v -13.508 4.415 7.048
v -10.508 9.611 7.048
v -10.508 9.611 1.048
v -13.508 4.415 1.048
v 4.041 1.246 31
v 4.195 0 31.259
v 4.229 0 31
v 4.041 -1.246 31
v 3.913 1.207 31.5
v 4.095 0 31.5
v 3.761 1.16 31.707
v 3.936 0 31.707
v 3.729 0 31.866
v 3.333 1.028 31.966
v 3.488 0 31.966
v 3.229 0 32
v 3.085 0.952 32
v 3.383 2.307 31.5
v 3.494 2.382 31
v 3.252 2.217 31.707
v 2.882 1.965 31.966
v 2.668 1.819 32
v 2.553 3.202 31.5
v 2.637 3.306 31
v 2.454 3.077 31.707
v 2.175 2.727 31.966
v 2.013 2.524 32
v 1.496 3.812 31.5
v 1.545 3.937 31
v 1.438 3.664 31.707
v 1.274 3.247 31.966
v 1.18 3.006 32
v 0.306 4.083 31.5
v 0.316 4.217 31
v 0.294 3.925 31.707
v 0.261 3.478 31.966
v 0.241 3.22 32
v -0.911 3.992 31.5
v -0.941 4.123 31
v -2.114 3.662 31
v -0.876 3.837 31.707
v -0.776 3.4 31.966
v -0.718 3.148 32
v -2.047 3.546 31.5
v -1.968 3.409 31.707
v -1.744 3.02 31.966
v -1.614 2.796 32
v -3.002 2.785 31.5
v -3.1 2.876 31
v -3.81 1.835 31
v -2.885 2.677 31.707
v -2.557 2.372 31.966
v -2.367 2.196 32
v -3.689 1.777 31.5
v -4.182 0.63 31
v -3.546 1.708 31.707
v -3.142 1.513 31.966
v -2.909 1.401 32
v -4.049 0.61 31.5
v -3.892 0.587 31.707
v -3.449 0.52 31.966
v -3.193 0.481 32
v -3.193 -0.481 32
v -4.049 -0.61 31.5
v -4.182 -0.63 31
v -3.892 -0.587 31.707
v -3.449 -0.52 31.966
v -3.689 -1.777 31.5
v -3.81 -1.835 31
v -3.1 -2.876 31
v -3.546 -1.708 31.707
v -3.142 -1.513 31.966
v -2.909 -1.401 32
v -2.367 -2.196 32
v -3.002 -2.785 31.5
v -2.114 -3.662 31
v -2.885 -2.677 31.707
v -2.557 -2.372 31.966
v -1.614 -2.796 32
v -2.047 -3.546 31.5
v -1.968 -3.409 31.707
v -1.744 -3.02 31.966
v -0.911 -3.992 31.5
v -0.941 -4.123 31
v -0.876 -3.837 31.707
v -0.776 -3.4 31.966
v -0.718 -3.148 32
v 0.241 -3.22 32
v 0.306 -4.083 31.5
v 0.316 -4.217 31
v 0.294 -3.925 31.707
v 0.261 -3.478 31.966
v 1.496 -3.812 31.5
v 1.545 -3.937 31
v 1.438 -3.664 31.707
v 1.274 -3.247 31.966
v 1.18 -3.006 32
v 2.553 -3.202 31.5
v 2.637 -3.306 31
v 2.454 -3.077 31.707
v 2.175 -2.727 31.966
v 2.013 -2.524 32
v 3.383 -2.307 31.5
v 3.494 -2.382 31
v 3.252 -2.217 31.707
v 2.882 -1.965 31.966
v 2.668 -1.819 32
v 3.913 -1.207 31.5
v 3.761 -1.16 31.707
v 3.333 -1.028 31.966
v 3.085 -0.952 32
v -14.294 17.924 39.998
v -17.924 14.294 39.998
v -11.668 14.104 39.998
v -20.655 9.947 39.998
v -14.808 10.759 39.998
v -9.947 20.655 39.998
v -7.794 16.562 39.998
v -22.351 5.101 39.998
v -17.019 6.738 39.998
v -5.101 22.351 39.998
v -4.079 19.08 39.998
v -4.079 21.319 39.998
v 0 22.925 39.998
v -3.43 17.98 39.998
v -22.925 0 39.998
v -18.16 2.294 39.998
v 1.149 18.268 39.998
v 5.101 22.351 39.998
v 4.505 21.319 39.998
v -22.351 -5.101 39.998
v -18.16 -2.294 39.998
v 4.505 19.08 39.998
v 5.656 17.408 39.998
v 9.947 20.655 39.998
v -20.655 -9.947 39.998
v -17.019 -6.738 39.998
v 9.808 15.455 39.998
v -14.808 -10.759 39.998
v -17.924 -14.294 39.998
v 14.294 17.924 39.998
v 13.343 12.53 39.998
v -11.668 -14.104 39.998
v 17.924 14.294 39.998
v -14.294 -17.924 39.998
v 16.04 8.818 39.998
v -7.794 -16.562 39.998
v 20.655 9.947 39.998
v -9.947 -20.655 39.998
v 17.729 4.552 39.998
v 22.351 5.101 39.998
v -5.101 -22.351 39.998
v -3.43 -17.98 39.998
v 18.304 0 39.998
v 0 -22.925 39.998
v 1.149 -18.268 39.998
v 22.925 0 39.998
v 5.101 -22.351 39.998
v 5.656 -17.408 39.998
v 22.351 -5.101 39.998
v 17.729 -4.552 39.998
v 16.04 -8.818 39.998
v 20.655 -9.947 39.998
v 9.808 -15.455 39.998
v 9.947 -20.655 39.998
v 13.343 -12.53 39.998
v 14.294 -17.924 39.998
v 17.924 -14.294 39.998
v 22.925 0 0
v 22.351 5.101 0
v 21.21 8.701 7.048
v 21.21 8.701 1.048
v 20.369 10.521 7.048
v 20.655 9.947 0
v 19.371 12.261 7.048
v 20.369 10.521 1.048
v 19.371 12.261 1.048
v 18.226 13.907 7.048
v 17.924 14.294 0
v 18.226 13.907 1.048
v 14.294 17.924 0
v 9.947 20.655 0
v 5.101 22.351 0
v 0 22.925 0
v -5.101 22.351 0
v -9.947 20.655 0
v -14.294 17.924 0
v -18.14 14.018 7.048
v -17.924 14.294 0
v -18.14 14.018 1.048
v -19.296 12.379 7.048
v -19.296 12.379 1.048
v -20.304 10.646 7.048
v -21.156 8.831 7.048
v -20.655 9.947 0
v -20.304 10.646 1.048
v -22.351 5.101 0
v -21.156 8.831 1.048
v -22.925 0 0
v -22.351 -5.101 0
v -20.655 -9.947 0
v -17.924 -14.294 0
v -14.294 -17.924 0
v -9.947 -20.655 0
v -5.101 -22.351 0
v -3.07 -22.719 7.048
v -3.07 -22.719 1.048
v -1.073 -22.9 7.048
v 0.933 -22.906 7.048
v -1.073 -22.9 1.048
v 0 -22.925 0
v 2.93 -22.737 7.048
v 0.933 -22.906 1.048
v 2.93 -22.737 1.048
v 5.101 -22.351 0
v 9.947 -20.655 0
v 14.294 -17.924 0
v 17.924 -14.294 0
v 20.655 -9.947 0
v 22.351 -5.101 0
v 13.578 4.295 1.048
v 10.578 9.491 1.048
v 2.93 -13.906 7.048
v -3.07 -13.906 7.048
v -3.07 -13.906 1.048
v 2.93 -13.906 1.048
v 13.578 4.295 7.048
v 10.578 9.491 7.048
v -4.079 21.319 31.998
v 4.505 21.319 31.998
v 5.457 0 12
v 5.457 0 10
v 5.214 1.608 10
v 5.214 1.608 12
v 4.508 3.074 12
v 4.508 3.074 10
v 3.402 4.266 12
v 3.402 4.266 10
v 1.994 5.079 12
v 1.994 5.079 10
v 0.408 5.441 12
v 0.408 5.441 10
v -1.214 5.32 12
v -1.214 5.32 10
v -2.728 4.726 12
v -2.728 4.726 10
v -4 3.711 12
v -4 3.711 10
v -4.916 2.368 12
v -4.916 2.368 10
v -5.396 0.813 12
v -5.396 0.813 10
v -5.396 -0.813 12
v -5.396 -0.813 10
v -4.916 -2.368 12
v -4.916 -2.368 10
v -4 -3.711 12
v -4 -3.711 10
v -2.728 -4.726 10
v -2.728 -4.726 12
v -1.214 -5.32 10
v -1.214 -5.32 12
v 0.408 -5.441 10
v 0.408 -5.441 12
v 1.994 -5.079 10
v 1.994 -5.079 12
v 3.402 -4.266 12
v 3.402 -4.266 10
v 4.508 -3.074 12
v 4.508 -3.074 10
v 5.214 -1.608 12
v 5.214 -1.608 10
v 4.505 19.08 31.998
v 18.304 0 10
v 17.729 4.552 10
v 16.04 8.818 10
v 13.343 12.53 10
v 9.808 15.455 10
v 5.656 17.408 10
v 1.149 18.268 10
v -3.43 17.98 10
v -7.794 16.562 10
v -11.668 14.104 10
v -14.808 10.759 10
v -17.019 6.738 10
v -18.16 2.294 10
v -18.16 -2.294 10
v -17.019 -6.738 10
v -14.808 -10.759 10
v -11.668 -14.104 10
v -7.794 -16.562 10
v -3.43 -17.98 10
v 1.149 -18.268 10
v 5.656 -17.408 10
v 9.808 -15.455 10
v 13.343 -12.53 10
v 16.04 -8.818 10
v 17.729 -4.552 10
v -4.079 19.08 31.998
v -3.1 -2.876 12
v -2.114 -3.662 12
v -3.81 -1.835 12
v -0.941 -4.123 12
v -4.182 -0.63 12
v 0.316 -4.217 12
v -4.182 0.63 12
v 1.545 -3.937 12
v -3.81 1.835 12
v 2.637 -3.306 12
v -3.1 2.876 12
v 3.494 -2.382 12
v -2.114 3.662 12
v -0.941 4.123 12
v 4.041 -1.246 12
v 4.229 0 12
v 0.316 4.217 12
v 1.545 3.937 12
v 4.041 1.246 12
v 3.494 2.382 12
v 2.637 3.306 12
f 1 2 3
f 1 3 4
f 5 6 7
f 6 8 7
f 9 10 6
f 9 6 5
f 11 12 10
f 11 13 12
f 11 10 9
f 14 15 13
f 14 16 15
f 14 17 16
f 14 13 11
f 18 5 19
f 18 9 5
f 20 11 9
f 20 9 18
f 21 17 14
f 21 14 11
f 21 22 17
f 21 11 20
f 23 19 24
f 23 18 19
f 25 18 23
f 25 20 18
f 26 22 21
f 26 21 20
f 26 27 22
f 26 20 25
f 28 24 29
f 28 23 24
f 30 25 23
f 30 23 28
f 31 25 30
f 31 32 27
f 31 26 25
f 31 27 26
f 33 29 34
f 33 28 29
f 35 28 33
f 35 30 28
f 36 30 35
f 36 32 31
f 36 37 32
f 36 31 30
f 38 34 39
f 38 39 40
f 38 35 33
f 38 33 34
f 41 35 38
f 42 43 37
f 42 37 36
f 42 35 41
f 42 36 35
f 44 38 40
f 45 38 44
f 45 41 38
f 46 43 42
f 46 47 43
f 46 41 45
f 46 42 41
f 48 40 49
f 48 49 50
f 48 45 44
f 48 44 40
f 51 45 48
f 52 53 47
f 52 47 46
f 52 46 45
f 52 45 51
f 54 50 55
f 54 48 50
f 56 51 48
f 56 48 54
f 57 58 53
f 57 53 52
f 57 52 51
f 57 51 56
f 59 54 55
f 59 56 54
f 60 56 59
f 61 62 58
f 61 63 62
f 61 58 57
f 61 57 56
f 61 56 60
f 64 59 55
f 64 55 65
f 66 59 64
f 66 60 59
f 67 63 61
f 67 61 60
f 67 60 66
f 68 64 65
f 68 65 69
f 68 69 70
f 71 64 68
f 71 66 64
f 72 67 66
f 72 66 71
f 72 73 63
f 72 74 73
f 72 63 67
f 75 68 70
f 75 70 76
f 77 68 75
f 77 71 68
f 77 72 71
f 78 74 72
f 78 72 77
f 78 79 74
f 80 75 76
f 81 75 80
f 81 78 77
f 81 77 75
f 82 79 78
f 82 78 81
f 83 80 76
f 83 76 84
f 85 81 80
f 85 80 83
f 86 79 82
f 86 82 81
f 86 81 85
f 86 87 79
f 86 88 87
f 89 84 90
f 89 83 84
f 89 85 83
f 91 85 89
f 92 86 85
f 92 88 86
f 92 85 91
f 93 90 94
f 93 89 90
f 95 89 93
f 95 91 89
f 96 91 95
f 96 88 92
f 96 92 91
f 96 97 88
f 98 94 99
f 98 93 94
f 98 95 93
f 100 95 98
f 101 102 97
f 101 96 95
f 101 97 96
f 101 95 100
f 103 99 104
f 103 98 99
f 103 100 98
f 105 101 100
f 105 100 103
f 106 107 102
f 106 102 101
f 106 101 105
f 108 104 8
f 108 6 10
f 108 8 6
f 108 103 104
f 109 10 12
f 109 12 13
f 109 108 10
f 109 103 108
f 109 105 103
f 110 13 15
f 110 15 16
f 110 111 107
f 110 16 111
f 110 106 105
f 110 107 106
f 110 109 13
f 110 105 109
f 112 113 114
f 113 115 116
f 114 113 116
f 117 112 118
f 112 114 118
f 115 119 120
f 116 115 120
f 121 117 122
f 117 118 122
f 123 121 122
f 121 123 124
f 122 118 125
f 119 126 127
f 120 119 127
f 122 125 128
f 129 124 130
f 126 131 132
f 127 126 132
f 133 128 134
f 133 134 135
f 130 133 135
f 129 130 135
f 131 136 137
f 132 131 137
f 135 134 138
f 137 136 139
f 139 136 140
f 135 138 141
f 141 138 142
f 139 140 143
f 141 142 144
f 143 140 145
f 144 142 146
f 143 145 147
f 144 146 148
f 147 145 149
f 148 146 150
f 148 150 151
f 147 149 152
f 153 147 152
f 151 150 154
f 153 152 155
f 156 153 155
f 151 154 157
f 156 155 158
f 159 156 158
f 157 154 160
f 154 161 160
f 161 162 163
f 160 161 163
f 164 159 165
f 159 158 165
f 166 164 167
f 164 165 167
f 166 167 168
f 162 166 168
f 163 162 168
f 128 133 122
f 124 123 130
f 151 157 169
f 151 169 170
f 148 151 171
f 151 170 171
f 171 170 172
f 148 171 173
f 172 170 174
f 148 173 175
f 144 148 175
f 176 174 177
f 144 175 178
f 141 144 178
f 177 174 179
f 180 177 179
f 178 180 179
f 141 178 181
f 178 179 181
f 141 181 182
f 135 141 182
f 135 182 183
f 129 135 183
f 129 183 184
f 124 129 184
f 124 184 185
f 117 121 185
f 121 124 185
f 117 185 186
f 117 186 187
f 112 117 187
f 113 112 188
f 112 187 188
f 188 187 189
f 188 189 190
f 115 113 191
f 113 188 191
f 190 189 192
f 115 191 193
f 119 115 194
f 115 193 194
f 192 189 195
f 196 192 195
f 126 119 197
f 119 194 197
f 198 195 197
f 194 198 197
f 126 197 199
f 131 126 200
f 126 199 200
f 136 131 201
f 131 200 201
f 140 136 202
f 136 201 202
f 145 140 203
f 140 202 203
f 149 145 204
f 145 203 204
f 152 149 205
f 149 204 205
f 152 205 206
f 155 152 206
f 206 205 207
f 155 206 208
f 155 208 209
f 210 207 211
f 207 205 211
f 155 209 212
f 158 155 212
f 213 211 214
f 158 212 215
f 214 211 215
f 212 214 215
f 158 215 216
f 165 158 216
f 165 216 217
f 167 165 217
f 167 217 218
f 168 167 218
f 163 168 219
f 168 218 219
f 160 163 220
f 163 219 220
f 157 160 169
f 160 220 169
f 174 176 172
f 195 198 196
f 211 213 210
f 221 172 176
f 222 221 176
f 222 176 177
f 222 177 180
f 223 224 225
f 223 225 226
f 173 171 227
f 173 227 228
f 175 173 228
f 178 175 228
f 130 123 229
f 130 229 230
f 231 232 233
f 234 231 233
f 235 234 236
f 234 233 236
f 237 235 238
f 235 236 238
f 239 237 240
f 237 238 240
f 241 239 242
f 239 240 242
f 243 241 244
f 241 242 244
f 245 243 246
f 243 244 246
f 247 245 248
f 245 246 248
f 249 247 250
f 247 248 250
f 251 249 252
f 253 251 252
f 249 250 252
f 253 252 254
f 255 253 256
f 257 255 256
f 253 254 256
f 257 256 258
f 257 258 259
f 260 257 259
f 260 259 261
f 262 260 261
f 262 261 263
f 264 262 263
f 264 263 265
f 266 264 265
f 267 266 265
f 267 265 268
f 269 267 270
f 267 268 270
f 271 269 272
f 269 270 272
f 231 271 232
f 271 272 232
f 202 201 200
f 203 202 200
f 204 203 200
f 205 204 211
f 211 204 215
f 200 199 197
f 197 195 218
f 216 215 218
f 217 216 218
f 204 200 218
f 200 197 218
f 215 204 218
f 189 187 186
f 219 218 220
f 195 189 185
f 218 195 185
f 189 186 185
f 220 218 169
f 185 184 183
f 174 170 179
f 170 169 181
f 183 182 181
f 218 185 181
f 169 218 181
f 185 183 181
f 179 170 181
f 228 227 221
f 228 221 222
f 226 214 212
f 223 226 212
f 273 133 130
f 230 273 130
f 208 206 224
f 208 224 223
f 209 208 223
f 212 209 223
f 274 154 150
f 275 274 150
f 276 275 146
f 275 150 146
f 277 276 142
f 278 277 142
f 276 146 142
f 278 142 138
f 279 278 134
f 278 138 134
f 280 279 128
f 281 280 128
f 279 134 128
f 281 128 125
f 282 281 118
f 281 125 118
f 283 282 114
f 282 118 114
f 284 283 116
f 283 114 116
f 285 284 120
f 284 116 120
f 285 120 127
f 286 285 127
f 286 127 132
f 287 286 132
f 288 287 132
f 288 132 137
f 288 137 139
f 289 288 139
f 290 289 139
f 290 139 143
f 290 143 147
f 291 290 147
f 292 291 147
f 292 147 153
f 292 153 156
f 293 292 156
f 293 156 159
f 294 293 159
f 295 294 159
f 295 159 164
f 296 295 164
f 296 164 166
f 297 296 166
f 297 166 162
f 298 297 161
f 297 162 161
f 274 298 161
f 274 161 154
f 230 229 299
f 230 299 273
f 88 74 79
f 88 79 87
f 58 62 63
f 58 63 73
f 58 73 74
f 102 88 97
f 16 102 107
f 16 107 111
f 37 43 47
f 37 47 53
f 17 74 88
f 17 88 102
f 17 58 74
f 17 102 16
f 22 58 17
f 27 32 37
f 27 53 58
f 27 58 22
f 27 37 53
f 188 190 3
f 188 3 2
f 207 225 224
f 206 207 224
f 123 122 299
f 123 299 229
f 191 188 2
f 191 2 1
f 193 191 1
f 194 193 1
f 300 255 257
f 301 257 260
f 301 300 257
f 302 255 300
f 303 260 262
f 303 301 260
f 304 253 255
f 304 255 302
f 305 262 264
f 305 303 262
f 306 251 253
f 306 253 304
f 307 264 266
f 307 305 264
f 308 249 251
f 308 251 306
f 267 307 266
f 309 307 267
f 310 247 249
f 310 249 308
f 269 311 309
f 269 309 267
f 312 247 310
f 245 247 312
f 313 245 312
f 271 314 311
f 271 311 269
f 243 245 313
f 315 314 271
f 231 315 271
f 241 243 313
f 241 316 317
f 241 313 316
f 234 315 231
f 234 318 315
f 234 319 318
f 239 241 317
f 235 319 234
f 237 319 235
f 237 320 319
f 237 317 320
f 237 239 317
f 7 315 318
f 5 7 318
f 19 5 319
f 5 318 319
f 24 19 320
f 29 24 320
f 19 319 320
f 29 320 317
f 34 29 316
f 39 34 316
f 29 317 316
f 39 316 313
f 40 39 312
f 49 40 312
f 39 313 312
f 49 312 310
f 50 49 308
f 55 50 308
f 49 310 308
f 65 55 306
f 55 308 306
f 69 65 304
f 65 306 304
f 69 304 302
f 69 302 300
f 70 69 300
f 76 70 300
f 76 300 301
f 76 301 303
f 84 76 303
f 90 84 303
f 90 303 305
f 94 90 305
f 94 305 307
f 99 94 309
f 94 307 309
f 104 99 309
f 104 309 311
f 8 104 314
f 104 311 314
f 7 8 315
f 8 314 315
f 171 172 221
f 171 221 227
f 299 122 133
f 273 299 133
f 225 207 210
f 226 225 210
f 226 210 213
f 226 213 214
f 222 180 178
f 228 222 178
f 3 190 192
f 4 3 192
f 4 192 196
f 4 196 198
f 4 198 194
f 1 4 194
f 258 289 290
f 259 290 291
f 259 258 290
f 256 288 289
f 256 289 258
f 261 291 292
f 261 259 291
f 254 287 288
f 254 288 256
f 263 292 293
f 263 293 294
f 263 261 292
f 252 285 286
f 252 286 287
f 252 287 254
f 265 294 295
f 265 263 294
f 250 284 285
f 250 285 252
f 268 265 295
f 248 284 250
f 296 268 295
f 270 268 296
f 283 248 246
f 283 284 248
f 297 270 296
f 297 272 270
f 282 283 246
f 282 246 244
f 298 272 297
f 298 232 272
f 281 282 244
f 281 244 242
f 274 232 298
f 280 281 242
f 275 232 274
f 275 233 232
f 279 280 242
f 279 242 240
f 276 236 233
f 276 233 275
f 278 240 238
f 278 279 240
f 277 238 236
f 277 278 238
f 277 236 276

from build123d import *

# Parameters (mm, degrees)
SKETCH_R           = 22.9254053499
PAD_DEPTH          = 40
SKETCH001_R        = 18.304244
POCKET_DEPTH       = 30
SKETCH002_R        = 5.45658
PAD001_DEPTH       = 2
SKETCH003_R        = 4.228884
PAD002_DEPTH       = 20
FILLET_R           = 1
SKETCH004_W        = 47.033489
SKETCH004_H        = 47.446069
PAD003_DEPTH       = 10
SKETCH005_W        = 6
SKETCH005_H        = 6
POCKET001_DEPTH    = 10
POLARPATTERN_COUNT = 3
SKETCH006_W        = 48.955269
SKETCH006_H        = 10.757687
POCKET002_DEPTH    = 47.447069
SKETCH007_W        = 8.584595
SKETCH007_H        = 2.239462
POCKET003_DEPTH    = 8


with BuildPart() as part:
    # Sketch → Pad (new body)
    with BuildSketch(Plane.XY):
        Circle(SKETCH_R)
    extrude(amount=PAD_DEPTH)

    # Sketch001 (on Face3 of Pad) → Pocket (cut)
    with BuildSketch(Plane.XY.offset(40)):
        Circle(SKETCH001_R)
    extrude(amount=-POCKET_DEPTH, mode=Mode.SUBTRACT)

    # Sketch002 (on Face5 of Pocket) → Pad001 (join)
    with BuildSketch(Plane.XY.offset(10)):
        Circle(SKETCH002_R)
    extrude(amount=PAD001_DEPTH)

    # Sketch003 (on Face7 of Pad001) → Pad002 (join)
    with BuildSketch(Plane.XY.offset(12)):
        Circle(SKETCH003_R)
    extrude(amount=PAD002_DEPTH)

    # Fillet
    fillet_edges = [part.edges().sort_by_distance(p)[0] for p in [
        (-4.228884, 0, 32),
    ]]
    fillet(fillet_edges, radius=FILLET_R)

    # Sketch004 (on Face8 of Fillet) → Pad003 (join)
    with BuildSketch(Plane.XY.offset(40)):
        with Locations((0.1454045, -0.1830035)):
            Rectangle(SKETCH004_W, SKETCH004_H)
    extrude(amount=PAD003_DEPTH)

    # Sketch005 (on Face6 of Pad003) → Pocket001 (cut)
    with BuildSketch(Plane.XZ.offset(23.906038)):
        with Locations((-0.0695171845, 4.0478014172)):
            Rectangle(SKETCH005_W, SKETCH005_H)
    pocket001 = extrude(amount=-POCKET001_DEPTH, mode=Mode.SUBTRACT)

    # PolarPattern: Pocket001 ×3 about axis
    polarpattern_axis = Axis((0, 0, 0), (0, 0, 1))
    for i in range(1, POLARPATTERN_COUNT):
        add(pocket001.rotate(polarpattern_axis, i * 360 / POLARPATTERN_COUNT), mode=Mode.SUBTRACT)

    # Sketch006 (on Face6 of PolarPattern) → Pocket002 (cut, through all)
    with BuildSketch(Plane.XZ.offset(23.906038)):
        with Locations((-0.0126055, 45.3770425)):
            Rectangle(SKETCH006_W, SKETCH006_H)
    extrude(amount=-POCKET002_DEPTH, mode=Mode.SUBTRACT)

    # Sketch007 (on Face2 of Pocket002) → Pocket003 (cut)
    with BuildSketch(Plane.XY.offset(39.998199)):
        with Locations((0.2128695, 20.199645)):
            Rectangle(SKETCH007_W, SKETCH007_H)
    extrude(amount=-POCKET003_DEPTH, mode=Mode.SUBTRACT)


solid = part.part
